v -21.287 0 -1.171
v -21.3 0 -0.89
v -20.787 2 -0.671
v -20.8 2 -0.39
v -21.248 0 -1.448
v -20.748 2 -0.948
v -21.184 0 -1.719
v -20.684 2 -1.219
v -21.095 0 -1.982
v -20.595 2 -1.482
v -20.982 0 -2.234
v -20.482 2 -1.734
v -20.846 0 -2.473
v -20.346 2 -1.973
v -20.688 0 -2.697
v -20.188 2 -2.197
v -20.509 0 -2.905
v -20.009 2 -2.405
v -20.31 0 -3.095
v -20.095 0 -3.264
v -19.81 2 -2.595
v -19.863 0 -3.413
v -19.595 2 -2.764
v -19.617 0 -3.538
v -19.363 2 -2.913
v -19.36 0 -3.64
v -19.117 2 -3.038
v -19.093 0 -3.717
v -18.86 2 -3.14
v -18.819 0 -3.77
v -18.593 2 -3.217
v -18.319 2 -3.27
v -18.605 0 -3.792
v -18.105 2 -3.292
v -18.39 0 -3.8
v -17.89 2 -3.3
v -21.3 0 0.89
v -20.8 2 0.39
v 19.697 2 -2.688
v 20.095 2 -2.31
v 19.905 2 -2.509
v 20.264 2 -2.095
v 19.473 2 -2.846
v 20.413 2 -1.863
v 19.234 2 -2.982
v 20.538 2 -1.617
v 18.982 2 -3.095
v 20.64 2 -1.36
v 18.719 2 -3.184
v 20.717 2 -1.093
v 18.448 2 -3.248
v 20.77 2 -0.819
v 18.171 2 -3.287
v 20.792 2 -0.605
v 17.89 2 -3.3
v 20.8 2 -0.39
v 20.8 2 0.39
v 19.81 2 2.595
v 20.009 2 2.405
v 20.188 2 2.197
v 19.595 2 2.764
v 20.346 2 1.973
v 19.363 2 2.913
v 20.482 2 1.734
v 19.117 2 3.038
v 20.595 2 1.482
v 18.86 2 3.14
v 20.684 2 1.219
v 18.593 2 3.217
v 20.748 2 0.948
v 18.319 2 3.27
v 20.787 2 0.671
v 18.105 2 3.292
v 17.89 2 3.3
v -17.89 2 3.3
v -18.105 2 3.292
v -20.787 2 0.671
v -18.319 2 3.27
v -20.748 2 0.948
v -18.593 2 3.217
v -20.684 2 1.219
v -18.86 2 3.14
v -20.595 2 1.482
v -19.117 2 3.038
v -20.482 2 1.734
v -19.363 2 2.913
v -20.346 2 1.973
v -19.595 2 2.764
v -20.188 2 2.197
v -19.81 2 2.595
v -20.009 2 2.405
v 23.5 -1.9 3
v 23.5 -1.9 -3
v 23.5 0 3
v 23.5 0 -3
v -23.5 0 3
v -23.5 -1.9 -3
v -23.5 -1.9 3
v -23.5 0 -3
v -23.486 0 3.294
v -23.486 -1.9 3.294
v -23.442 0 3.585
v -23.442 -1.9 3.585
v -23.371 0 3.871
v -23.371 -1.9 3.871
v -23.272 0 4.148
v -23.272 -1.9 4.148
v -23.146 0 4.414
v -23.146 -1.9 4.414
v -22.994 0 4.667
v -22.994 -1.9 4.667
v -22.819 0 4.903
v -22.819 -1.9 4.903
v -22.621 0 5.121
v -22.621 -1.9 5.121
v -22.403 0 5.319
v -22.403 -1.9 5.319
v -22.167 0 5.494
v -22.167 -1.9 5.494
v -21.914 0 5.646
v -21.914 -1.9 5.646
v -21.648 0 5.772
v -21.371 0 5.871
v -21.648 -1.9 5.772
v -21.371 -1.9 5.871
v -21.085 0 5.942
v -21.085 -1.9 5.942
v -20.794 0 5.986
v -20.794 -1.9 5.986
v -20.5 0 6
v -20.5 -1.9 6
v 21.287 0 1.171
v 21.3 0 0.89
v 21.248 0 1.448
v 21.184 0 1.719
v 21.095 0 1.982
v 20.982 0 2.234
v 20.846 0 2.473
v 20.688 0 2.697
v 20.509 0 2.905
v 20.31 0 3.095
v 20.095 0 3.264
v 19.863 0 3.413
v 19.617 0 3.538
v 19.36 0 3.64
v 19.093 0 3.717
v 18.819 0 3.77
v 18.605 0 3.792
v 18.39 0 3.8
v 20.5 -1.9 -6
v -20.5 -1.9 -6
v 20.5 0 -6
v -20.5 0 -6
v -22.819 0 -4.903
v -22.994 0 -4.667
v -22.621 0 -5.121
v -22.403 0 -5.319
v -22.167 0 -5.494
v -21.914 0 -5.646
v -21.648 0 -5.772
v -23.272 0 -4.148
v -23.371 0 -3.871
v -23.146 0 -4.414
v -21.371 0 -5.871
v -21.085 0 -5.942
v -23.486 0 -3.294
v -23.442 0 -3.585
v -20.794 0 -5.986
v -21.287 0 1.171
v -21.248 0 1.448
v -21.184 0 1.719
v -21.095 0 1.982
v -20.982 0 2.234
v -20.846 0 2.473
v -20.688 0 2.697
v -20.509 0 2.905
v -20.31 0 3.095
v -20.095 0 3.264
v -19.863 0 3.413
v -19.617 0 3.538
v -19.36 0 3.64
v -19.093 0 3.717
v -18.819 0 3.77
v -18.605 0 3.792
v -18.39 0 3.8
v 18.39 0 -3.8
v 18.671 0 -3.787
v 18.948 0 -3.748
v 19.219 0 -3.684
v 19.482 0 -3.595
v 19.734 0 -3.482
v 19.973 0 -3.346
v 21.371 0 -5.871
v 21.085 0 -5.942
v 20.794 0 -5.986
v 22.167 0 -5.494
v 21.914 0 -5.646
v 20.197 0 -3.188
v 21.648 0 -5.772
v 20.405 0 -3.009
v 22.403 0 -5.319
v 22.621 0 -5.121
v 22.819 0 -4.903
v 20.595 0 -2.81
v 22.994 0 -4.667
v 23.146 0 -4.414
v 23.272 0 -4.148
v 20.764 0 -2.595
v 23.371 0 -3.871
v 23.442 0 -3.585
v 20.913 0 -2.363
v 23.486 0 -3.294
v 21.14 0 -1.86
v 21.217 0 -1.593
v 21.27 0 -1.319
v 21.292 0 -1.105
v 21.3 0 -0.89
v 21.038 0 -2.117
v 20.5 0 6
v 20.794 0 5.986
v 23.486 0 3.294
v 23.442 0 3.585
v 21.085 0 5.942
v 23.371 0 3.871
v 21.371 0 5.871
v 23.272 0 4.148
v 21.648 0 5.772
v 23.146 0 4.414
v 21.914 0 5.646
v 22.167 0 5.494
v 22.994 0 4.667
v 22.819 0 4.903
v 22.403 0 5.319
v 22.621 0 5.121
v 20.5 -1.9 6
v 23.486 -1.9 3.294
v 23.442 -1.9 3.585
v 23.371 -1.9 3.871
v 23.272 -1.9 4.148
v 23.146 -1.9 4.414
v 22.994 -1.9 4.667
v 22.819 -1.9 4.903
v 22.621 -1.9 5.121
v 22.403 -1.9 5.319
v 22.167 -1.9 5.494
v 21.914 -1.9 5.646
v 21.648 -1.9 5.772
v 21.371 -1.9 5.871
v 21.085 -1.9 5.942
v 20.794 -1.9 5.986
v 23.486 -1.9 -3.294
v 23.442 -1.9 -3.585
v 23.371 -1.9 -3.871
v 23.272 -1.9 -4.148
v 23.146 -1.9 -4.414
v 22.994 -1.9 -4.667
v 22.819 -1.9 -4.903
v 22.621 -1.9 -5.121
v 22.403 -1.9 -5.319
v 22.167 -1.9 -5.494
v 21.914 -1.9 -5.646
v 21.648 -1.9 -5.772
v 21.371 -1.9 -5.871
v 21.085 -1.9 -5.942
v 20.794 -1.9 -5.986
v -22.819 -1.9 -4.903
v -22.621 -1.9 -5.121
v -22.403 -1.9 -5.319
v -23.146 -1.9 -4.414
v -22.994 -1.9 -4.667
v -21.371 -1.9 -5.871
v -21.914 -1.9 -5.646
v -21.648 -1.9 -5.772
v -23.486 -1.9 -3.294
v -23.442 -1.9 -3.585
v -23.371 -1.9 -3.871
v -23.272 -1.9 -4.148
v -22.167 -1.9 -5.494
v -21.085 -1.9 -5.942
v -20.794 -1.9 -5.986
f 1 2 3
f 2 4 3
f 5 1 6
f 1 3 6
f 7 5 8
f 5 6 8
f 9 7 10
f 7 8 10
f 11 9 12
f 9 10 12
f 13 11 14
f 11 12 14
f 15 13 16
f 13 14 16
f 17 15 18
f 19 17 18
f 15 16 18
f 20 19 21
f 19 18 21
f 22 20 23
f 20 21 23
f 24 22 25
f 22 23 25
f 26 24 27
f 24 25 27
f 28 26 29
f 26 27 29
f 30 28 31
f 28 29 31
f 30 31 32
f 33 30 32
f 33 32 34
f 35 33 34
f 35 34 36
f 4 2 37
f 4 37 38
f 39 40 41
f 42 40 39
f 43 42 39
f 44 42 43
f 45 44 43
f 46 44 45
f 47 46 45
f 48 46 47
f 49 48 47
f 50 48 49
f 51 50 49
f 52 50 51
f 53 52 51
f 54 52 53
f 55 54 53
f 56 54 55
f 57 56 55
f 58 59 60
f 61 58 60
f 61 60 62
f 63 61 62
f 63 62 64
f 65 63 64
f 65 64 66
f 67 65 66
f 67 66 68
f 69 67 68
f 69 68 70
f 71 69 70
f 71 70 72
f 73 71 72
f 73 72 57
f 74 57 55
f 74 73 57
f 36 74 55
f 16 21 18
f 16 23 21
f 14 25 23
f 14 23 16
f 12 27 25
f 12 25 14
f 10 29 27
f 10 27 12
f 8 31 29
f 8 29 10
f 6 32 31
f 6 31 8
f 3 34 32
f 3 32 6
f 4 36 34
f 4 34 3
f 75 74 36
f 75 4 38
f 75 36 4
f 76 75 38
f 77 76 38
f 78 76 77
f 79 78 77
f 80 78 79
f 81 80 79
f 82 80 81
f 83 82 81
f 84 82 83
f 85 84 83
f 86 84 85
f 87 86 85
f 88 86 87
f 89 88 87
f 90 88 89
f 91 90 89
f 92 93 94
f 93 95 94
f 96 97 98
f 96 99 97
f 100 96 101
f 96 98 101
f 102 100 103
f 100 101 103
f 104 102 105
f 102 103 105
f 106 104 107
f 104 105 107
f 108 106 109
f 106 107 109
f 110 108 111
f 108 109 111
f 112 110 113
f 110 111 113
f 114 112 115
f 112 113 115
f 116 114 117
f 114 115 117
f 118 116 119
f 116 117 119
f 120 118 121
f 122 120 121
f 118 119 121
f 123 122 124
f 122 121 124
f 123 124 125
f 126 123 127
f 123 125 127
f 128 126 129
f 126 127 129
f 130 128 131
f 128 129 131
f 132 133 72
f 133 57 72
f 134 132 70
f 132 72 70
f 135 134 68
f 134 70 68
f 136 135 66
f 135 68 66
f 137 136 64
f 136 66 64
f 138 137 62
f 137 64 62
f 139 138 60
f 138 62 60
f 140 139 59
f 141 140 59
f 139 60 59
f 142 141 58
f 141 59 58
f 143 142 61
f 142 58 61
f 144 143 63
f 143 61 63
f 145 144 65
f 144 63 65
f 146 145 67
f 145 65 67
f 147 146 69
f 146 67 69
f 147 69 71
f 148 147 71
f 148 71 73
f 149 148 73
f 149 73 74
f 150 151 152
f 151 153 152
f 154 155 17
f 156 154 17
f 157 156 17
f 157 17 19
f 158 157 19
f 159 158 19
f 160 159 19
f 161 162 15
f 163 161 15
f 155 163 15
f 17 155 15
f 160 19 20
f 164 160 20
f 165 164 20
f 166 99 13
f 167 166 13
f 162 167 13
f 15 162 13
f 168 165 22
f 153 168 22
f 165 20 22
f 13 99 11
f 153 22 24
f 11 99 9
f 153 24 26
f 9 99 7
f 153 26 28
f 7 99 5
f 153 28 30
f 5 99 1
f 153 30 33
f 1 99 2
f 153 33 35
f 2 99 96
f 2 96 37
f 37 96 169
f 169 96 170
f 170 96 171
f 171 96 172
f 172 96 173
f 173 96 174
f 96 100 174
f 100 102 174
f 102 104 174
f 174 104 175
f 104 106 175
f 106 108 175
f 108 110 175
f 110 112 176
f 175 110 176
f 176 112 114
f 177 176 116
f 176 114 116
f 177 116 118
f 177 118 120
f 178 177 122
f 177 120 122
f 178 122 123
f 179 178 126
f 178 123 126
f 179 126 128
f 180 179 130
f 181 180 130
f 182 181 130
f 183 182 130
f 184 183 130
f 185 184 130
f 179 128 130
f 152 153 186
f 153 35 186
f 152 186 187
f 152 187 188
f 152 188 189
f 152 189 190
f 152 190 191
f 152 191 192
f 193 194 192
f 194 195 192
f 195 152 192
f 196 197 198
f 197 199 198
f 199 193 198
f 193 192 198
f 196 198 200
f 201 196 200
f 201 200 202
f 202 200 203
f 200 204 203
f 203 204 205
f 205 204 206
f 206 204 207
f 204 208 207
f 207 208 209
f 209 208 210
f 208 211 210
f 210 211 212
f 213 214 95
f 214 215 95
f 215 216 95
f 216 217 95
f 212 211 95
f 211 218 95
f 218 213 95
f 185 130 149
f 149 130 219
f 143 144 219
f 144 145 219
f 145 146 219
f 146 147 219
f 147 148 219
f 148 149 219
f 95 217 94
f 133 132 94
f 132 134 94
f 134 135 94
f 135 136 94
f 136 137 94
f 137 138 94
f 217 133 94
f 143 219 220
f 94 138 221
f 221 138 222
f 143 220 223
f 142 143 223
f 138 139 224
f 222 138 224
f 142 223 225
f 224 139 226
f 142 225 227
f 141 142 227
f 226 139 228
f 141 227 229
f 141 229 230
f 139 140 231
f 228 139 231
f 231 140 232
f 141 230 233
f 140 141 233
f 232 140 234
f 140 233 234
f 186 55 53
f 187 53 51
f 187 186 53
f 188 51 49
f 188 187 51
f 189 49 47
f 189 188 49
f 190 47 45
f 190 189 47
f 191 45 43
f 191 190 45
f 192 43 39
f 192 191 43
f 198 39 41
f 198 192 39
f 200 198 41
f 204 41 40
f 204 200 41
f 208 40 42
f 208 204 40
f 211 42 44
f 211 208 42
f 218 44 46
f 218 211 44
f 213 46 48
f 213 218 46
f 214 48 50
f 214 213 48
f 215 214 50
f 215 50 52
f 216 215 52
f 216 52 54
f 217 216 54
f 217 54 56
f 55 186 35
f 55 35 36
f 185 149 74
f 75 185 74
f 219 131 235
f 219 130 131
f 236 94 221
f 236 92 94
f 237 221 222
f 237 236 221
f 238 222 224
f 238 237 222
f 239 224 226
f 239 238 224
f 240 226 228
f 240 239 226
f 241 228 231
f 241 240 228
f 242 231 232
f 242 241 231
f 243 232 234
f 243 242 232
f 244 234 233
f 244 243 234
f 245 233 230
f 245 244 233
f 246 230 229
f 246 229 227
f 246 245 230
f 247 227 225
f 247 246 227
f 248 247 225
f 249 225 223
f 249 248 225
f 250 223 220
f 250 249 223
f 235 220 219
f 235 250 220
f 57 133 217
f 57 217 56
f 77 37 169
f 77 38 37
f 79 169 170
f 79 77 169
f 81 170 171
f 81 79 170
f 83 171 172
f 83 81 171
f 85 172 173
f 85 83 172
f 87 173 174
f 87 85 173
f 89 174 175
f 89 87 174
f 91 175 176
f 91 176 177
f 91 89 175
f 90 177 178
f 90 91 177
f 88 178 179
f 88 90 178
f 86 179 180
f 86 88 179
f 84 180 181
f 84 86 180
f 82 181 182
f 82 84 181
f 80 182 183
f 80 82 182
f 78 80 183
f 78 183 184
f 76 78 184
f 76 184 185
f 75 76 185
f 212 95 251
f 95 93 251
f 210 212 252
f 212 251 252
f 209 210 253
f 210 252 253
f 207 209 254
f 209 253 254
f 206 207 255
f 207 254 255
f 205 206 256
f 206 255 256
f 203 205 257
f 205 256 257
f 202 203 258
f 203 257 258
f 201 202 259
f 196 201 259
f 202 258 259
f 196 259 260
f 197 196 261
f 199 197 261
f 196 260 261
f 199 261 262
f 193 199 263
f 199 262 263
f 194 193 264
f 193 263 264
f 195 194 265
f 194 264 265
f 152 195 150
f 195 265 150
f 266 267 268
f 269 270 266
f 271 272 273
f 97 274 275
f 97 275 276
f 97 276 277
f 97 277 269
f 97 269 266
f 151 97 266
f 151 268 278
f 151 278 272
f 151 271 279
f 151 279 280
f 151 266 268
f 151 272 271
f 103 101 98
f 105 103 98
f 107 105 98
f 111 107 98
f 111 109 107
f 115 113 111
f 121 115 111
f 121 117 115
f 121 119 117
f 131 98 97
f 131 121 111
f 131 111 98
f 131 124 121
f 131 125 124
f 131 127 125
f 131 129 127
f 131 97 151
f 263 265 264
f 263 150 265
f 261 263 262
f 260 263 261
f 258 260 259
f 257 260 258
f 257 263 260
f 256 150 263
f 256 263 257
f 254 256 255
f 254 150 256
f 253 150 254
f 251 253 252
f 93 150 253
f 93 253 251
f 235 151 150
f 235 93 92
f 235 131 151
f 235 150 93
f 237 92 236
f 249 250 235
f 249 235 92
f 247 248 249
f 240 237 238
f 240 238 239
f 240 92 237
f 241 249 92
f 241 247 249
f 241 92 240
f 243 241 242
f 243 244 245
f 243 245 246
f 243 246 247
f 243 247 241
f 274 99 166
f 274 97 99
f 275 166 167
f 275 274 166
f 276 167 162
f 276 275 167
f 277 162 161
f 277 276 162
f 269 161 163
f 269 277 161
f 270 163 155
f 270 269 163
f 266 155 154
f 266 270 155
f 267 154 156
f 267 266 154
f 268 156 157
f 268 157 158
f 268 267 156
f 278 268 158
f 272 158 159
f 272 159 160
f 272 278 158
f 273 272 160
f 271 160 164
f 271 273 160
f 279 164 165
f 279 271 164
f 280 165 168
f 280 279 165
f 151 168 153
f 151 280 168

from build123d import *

# Parameters (mm, degrees)
F0_W         = 47
F0_H         = 12
F1_DEPTH     = 1.9
F2_W         = 42.6
F2_H         = 7.6
F3_DEPTH     = 2
F4_T4_DEPTH  = 52.9885099991
F4_T9_DEPTH  = 17.9885099991
F4_T14_DEPTH = 52.9885099991
F4_T19_DEPTH = 17.9885099991
F5_R         = 3


# Not quite as in the source:
# - a fillet or chamfer that OpenCascade refuses, or shapes differently, is made with other operations: its cross-section is extruded or revolved along the edge and cut away or added


with BuildPart() as f1:
    # F0 (on Front) → F1 (new body)
    with BuildSketch(Plane.XZ):
        Rectangle(F0_W, F0_H)
    extrude(amount=F1_DEPTH)

    # F2 (on face) → F3 (join)
    with BuildSketch(Plane(origin=(0, 0, 0), x_dir=(-1, 0, 0), z_dir=(0, 1, 0))):
        Rectangle(F2_W, F2_H)
    extrude(amount=F3_DEPTH)

    # F4: chamfer of 0.5 x 2 on 4 edges, made by hand


with BuildPart() as f4_tool2:
    # F4_s3 → F4_t4 (new body)
    with BuildSketch(Plane.YZ.offset(26.4942549995)):
        Polygon((0, -3.8), (2, -3.3), (2, -3.8), align=None)
    extrude(amount=-F4_T4_DEPTH)

    split(bisect_by=Plane.XZ, keep=Keep.BOTTOM)


with BuildPart() as f1_1:
    add(f1.part)

    # F4_t1: cut F4_tool2
    add(f4_tool2.part, mode=Mode.SUBTRACT)


with BuildPart() as f4_tool7:
    # F4_s8 → F4_t9 (new body)
    with BuildSketch(Plane.XY.offset(-8.9942549995)):
        Polygon((-21.3, 0), (-20.8, 2), (-21.3, 2), align=None)
    extrude(amount=F4_T9_DEPTH)

    split(bisect_by=Plane.XZ, keep=Keep.BOTTOM)


with BuildPart() as f1_2:
    add(f1_1.part)

    # F4_t6: cut F4_tool7
    add(f4_tool7.part, mode=Mode.SUBTRACT)


with BuildPart() as f4_tool12:
    # F4_s13 → F4_t14 (new body)
    with BuildSketch(Plane.YZ.offset(-26.4942549995)):
        Polygon((0, 3.8), (2, 3.3), (2, 3.8), align=None)
    extrude(amount=F4_T14_DEPTH)

    split(bisect_by=Plane.XZ, keep=Keep.BOTTOM)


with BuildPart() as f1_3:
    add(f1_2.part)

    # F4_t11: cut F4_tool12
    add(f4_tool12.part, mode=Mode.SUBTRACT)


with BuildPart() as f4_tool17:
    # F4_s18 → F4_t19 (new body)
    with BuildSketch(Plane.XY.offset(8.9942549995)):
        Polygon((21.3, 0), (20.8, 2), (21.3, 2), align=None)
    extrude(amount=-F4_T19_DEPTH)

    split(bisect_by=Plane.XZ, keep=Keep.BOTTOM)


with BuildPart() as f1_4:
    add(f1_3.part)

    # F4_t16: cut F4_tool17
    add(f4_tool17.part, mode=Mode.SUBTRACT)

    # F5
    f5_edges = [f1_4.edges().sort_by_distance(p)[0] for p in [
        (-23.5, -0.95, -6),
        (23.5, -0.95, -6),
        (23.5, -0.95, 6),
        (-23.5, -0.95, 6),
        (-21.05, 1, 3.55),
        (-21.05, 1, -3.55),
        (21.05, 1, 3.55),
        (21.05, 1, -3.55),
    ]]
    fillet(f5_edges, radius=F5_R)


solid = f1_4.part
